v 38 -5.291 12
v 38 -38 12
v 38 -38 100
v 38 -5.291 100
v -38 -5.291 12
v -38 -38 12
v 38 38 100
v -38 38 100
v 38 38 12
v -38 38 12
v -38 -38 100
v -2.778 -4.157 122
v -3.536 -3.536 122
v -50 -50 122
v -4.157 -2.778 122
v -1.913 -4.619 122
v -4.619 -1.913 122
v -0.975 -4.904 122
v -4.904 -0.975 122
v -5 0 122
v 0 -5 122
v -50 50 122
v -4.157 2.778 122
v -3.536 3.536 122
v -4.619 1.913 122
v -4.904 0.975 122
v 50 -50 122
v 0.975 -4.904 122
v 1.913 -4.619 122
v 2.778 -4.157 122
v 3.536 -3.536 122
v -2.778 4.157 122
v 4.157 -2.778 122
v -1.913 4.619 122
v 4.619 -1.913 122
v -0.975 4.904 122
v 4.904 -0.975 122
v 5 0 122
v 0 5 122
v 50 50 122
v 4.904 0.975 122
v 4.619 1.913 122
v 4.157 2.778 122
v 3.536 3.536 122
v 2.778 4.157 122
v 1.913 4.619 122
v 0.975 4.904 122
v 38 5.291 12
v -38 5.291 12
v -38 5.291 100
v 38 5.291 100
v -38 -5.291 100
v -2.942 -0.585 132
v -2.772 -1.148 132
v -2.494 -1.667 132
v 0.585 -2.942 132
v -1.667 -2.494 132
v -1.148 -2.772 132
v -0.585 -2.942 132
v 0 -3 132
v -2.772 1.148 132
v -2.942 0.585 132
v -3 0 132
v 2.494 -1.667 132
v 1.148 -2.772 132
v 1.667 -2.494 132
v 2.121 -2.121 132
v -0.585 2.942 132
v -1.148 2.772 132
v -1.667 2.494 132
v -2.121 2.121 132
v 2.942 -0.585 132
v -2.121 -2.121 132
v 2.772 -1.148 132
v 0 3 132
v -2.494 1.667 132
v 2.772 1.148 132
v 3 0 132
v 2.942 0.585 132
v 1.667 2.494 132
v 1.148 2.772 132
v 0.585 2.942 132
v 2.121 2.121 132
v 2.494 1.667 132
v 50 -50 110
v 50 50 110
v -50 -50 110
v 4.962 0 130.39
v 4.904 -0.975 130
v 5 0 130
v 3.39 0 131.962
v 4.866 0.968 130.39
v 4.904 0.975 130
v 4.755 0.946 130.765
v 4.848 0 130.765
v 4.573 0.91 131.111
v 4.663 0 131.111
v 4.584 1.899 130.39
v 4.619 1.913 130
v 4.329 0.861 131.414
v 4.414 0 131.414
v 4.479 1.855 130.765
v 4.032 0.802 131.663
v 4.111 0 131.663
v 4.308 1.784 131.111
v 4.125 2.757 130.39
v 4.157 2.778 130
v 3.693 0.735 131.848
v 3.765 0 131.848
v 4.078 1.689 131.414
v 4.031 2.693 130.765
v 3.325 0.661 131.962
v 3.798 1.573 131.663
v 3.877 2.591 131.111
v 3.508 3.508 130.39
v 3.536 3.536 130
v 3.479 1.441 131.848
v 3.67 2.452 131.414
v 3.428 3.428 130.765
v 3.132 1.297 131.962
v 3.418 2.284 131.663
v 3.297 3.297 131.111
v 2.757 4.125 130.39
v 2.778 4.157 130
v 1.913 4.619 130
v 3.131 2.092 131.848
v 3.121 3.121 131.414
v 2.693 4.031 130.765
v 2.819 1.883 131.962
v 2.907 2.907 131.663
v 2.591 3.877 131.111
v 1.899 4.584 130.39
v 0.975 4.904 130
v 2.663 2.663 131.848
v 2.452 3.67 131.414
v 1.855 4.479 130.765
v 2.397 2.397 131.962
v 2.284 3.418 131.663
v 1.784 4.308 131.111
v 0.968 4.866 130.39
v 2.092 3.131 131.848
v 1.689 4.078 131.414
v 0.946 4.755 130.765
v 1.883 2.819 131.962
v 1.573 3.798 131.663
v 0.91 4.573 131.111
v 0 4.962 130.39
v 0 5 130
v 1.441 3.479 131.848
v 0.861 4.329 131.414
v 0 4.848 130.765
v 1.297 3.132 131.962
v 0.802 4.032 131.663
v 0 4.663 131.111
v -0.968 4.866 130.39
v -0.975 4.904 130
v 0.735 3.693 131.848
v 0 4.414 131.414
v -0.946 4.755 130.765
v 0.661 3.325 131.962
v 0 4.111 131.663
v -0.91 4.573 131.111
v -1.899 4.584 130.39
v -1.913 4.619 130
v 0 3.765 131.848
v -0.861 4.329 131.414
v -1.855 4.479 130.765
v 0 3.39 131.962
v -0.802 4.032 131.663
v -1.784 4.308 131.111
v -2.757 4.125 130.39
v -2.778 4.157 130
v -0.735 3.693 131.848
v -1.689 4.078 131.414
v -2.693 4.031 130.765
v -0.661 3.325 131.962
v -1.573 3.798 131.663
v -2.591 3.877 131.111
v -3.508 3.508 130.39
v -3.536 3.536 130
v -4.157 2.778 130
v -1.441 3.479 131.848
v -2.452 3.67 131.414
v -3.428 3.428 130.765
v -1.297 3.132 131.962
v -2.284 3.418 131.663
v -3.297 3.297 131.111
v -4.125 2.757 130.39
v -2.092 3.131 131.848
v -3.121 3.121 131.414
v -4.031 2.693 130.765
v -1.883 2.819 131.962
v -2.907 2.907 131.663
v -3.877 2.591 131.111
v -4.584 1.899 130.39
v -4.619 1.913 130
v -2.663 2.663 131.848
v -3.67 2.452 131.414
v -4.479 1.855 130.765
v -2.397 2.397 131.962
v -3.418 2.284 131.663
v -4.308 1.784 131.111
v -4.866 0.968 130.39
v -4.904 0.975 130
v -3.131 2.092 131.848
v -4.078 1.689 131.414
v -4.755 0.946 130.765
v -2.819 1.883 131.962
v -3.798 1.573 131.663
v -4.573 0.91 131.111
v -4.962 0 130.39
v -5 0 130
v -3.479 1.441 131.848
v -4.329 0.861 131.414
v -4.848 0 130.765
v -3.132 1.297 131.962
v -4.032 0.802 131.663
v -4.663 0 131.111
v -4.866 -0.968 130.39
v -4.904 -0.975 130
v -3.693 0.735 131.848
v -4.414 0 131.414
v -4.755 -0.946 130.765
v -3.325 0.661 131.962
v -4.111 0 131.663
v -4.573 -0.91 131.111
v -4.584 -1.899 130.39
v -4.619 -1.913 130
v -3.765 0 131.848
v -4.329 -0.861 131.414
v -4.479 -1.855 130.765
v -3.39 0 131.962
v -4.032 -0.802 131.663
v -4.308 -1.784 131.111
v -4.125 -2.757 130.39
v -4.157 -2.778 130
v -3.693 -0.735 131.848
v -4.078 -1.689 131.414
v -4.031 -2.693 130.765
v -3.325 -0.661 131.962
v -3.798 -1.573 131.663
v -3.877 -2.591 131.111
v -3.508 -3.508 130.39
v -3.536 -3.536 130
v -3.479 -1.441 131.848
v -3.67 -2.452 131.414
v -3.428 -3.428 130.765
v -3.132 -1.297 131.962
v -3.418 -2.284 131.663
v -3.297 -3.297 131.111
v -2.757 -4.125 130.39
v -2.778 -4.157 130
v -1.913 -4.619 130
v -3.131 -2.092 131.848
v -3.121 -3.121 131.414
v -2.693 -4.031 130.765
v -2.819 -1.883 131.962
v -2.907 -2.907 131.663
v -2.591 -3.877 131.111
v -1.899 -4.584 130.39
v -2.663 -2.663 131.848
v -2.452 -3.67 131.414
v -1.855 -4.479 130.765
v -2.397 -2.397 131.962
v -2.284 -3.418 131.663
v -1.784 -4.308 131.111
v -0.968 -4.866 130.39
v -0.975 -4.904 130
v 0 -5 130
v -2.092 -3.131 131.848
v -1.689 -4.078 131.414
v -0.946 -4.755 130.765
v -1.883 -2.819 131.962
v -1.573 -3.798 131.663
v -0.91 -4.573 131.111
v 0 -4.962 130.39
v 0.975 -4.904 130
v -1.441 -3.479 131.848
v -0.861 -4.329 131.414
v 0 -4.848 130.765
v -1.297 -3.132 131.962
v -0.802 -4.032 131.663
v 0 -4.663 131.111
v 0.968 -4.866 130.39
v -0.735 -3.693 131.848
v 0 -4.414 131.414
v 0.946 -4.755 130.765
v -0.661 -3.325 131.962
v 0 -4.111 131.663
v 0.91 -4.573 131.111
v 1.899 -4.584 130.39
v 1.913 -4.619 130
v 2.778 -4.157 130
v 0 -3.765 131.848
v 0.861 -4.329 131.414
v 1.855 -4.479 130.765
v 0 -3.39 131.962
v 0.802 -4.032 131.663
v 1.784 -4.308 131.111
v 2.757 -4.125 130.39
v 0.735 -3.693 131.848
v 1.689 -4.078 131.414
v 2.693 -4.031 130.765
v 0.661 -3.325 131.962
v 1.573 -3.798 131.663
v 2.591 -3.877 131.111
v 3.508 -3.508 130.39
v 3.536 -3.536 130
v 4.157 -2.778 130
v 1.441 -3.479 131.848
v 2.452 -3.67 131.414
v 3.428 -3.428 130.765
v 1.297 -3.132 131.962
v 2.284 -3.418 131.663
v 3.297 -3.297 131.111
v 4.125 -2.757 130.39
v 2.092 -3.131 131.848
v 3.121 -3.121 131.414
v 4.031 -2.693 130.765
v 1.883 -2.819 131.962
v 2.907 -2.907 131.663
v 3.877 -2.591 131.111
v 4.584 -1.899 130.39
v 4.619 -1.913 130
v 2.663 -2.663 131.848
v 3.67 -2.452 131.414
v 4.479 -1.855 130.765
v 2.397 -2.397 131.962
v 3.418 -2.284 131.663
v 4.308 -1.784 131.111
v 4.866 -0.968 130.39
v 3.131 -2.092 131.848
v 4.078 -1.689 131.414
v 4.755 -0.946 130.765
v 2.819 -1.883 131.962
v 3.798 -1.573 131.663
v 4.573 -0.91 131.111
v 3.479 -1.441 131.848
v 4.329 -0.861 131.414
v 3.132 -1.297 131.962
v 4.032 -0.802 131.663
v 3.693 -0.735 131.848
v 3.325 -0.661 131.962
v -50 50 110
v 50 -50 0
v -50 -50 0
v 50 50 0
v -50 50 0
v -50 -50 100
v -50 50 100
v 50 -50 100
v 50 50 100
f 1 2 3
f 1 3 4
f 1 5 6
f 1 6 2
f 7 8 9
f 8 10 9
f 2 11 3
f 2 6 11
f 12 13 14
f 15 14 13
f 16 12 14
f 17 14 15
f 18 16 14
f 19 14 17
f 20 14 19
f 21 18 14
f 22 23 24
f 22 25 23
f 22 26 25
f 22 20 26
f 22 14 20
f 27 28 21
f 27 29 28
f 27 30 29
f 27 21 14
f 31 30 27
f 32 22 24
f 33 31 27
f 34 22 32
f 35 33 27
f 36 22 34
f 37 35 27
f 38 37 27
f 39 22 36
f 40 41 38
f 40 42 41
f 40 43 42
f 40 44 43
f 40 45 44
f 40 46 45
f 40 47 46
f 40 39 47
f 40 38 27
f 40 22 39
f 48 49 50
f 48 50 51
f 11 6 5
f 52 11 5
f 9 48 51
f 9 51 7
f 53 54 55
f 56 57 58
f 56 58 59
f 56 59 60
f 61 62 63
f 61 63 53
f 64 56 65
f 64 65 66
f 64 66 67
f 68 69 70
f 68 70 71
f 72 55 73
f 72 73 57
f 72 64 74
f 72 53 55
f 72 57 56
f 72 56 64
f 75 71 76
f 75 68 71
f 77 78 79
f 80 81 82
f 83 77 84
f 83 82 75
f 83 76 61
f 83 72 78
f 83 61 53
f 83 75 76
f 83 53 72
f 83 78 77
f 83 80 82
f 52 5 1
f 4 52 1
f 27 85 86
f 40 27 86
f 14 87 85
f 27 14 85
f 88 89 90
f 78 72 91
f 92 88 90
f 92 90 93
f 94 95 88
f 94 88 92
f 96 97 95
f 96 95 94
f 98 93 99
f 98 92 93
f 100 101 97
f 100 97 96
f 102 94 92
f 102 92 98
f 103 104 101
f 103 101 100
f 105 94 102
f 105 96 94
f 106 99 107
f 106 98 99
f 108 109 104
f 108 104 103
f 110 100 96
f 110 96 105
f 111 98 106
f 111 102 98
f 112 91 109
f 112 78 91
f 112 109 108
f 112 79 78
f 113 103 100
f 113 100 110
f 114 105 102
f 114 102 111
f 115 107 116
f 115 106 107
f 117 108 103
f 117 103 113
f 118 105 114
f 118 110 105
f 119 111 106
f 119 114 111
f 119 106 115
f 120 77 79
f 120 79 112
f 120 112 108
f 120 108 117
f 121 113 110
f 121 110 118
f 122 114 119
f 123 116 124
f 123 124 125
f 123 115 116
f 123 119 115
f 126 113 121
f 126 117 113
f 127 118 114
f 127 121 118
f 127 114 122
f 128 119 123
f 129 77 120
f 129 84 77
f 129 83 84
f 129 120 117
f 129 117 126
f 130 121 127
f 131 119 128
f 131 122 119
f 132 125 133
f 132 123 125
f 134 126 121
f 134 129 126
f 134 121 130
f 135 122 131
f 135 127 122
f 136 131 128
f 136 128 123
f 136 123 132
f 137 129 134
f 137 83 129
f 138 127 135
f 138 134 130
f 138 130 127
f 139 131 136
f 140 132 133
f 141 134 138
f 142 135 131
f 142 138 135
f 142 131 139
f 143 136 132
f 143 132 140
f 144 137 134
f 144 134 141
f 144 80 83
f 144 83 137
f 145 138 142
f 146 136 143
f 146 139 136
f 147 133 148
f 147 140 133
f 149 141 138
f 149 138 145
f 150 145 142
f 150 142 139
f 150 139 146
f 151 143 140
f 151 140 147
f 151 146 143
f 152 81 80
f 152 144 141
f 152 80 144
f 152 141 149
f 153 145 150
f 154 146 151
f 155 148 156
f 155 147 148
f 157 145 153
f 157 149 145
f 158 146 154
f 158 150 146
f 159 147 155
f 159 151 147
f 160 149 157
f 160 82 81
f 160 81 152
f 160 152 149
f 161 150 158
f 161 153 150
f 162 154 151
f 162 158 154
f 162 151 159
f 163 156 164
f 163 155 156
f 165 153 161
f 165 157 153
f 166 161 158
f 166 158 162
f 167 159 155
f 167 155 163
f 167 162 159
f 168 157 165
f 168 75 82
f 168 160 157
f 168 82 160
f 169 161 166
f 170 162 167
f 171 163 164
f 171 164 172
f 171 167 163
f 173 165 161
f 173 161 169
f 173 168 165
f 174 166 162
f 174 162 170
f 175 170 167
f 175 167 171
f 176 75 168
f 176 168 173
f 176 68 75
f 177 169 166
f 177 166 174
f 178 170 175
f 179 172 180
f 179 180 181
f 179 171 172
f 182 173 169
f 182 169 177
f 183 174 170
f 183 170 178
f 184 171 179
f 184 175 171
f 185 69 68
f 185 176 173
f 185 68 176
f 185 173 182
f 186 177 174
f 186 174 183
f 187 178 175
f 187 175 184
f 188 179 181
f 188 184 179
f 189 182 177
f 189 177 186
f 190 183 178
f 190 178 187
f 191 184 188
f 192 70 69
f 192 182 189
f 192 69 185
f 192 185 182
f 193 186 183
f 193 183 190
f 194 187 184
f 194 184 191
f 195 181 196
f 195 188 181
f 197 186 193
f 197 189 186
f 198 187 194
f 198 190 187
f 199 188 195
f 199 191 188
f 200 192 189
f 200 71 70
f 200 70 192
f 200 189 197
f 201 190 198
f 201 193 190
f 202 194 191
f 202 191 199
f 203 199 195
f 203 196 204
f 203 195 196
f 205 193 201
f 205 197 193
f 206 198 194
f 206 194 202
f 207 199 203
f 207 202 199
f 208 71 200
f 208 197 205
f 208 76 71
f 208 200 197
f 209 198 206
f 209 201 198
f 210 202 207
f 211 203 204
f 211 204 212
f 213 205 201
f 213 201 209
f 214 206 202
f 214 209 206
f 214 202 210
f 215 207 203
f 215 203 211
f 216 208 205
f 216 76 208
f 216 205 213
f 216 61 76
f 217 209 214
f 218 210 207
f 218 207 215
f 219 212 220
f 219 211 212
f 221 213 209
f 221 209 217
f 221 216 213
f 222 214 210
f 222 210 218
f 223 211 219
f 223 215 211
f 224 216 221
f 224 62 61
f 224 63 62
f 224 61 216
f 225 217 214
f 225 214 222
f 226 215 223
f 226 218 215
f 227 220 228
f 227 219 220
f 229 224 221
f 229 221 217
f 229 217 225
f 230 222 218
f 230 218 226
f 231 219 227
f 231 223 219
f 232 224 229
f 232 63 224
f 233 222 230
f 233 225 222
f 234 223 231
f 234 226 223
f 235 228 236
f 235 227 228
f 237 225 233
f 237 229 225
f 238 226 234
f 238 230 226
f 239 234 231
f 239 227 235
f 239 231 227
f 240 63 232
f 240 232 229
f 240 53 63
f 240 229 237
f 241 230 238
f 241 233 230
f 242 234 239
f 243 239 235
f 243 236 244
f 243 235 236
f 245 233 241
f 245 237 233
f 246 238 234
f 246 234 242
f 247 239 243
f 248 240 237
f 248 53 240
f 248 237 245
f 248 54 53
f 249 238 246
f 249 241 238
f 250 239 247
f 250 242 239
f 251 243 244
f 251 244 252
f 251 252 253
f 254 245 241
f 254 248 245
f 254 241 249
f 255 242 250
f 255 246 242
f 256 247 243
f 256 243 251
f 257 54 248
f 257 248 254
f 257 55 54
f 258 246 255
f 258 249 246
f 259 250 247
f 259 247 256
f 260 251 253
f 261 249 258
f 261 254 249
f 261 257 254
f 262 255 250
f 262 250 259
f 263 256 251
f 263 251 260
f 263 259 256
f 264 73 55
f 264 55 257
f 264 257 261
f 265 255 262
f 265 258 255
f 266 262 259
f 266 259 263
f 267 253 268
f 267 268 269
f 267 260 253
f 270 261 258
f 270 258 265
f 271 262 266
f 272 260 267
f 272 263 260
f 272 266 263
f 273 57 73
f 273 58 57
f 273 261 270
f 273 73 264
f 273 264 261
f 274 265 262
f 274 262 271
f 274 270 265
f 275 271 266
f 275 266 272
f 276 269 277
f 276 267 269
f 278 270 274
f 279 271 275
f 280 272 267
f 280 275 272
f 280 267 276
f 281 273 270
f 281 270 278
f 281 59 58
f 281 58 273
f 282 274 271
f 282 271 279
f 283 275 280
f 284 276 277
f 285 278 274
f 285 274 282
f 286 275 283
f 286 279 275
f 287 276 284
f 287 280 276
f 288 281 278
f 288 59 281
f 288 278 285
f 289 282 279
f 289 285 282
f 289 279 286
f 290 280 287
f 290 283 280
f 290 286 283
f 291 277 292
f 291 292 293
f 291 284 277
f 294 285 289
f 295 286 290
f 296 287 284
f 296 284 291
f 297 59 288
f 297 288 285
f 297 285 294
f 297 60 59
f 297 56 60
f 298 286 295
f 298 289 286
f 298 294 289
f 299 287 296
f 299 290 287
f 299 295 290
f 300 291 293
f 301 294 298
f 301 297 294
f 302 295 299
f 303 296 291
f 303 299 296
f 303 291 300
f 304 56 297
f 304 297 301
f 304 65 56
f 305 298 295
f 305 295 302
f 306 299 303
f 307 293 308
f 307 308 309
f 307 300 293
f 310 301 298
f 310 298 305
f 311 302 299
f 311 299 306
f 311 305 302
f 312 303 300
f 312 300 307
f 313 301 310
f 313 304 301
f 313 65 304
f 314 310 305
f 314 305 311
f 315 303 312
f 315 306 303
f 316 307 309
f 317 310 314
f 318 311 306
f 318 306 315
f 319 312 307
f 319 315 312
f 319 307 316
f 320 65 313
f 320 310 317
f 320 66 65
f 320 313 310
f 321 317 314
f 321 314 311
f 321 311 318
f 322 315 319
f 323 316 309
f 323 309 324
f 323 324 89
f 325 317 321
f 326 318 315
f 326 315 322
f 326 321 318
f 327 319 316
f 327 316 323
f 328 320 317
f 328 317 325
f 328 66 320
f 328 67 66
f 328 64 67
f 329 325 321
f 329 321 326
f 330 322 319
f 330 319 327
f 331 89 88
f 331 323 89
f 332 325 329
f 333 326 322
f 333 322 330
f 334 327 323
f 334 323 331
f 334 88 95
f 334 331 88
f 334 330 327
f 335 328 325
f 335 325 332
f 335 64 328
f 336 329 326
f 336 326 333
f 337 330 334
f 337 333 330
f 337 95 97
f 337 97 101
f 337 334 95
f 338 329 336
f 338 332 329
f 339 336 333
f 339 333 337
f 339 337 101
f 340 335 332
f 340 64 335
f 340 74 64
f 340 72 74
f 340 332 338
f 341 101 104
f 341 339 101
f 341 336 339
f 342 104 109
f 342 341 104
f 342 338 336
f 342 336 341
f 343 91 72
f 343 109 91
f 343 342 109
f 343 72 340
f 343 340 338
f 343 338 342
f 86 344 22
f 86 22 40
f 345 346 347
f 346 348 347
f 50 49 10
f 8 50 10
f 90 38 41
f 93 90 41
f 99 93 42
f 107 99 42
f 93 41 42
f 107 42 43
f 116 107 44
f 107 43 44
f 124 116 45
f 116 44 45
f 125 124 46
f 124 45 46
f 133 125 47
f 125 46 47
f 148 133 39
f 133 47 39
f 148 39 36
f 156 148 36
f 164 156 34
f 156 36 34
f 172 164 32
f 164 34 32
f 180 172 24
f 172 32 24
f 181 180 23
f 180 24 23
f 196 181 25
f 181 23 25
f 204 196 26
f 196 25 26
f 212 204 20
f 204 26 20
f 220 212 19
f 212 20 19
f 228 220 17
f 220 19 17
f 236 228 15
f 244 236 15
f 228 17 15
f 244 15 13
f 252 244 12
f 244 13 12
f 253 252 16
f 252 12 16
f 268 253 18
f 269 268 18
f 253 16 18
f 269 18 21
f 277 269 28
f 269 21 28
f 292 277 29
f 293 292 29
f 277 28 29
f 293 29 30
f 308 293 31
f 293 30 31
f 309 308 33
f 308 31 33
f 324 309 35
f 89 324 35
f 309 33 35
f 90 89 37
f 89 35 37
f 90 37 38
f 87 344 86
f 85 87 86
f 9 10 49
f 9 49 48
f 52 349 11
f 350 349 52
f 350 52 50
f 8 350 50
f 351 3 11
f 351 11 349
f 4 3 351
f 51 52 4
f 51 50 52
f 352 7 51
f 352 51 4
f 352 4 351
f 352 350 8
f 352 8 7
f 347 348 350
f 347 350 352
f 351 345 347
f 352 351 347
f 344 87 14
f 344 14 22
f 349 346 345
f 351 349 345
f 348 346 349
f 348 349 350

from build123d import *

# Parameters (mm, degrees)
F0_W     = 100
F0_H     = 100
F1_DEPTH = 100
F2_T     = -12
F3_W     = 100
F3_H     = 10.582822
F4_DEPTH = 100
F6_W     = 100
F6_H     = 100
F7_DEPTH = 12
F8_R     = 5
F9_DEPTH = 10
F10_R    = 2


with BuildPart() as f1:
    # F0 (on Top) → F1 (new body)
    with BuildSketch(Plane.XY):
        Rectangle(F0_W, F0_H)
    extrude(amount=F1_DEPTH)

    # F2
    f2_openings = [f1.faces().sort_by_distance(p)[0] for p in [
        (0, 0, 100),
    ]]
    offset(amount=F2_T, openings=f2_openings)

    # F3 (on Top) → F4 (join)
    with BuildSketch(Plane.XY):
        Rectangle(F3_W, F3_H)
    extrude(amount=F4_DEPTH)


with BuildPart() as f7:
    # F6 (on offset) → F7 (new body)
    with BuildSketch(Plane.XY.offset(110)):
        Rectangle(F6_W, F6_H)
    extrude(amount=F7_DEPTH)

    # F8 (on face) → F9 (join)
    with BuildSketch(Plane.XY.offset(122)):
        Circle(F8_R)
    extrude(amount=F9_DEPTH)

    # F10
    f10_edges = [f7.edges().sort_by_distance(p)[0] for p in [
        (-5, 0, 132),
    ]]
    fillet(f10_edges, radius=F10_R)


solid = Compound([f1.part, f7.part])
